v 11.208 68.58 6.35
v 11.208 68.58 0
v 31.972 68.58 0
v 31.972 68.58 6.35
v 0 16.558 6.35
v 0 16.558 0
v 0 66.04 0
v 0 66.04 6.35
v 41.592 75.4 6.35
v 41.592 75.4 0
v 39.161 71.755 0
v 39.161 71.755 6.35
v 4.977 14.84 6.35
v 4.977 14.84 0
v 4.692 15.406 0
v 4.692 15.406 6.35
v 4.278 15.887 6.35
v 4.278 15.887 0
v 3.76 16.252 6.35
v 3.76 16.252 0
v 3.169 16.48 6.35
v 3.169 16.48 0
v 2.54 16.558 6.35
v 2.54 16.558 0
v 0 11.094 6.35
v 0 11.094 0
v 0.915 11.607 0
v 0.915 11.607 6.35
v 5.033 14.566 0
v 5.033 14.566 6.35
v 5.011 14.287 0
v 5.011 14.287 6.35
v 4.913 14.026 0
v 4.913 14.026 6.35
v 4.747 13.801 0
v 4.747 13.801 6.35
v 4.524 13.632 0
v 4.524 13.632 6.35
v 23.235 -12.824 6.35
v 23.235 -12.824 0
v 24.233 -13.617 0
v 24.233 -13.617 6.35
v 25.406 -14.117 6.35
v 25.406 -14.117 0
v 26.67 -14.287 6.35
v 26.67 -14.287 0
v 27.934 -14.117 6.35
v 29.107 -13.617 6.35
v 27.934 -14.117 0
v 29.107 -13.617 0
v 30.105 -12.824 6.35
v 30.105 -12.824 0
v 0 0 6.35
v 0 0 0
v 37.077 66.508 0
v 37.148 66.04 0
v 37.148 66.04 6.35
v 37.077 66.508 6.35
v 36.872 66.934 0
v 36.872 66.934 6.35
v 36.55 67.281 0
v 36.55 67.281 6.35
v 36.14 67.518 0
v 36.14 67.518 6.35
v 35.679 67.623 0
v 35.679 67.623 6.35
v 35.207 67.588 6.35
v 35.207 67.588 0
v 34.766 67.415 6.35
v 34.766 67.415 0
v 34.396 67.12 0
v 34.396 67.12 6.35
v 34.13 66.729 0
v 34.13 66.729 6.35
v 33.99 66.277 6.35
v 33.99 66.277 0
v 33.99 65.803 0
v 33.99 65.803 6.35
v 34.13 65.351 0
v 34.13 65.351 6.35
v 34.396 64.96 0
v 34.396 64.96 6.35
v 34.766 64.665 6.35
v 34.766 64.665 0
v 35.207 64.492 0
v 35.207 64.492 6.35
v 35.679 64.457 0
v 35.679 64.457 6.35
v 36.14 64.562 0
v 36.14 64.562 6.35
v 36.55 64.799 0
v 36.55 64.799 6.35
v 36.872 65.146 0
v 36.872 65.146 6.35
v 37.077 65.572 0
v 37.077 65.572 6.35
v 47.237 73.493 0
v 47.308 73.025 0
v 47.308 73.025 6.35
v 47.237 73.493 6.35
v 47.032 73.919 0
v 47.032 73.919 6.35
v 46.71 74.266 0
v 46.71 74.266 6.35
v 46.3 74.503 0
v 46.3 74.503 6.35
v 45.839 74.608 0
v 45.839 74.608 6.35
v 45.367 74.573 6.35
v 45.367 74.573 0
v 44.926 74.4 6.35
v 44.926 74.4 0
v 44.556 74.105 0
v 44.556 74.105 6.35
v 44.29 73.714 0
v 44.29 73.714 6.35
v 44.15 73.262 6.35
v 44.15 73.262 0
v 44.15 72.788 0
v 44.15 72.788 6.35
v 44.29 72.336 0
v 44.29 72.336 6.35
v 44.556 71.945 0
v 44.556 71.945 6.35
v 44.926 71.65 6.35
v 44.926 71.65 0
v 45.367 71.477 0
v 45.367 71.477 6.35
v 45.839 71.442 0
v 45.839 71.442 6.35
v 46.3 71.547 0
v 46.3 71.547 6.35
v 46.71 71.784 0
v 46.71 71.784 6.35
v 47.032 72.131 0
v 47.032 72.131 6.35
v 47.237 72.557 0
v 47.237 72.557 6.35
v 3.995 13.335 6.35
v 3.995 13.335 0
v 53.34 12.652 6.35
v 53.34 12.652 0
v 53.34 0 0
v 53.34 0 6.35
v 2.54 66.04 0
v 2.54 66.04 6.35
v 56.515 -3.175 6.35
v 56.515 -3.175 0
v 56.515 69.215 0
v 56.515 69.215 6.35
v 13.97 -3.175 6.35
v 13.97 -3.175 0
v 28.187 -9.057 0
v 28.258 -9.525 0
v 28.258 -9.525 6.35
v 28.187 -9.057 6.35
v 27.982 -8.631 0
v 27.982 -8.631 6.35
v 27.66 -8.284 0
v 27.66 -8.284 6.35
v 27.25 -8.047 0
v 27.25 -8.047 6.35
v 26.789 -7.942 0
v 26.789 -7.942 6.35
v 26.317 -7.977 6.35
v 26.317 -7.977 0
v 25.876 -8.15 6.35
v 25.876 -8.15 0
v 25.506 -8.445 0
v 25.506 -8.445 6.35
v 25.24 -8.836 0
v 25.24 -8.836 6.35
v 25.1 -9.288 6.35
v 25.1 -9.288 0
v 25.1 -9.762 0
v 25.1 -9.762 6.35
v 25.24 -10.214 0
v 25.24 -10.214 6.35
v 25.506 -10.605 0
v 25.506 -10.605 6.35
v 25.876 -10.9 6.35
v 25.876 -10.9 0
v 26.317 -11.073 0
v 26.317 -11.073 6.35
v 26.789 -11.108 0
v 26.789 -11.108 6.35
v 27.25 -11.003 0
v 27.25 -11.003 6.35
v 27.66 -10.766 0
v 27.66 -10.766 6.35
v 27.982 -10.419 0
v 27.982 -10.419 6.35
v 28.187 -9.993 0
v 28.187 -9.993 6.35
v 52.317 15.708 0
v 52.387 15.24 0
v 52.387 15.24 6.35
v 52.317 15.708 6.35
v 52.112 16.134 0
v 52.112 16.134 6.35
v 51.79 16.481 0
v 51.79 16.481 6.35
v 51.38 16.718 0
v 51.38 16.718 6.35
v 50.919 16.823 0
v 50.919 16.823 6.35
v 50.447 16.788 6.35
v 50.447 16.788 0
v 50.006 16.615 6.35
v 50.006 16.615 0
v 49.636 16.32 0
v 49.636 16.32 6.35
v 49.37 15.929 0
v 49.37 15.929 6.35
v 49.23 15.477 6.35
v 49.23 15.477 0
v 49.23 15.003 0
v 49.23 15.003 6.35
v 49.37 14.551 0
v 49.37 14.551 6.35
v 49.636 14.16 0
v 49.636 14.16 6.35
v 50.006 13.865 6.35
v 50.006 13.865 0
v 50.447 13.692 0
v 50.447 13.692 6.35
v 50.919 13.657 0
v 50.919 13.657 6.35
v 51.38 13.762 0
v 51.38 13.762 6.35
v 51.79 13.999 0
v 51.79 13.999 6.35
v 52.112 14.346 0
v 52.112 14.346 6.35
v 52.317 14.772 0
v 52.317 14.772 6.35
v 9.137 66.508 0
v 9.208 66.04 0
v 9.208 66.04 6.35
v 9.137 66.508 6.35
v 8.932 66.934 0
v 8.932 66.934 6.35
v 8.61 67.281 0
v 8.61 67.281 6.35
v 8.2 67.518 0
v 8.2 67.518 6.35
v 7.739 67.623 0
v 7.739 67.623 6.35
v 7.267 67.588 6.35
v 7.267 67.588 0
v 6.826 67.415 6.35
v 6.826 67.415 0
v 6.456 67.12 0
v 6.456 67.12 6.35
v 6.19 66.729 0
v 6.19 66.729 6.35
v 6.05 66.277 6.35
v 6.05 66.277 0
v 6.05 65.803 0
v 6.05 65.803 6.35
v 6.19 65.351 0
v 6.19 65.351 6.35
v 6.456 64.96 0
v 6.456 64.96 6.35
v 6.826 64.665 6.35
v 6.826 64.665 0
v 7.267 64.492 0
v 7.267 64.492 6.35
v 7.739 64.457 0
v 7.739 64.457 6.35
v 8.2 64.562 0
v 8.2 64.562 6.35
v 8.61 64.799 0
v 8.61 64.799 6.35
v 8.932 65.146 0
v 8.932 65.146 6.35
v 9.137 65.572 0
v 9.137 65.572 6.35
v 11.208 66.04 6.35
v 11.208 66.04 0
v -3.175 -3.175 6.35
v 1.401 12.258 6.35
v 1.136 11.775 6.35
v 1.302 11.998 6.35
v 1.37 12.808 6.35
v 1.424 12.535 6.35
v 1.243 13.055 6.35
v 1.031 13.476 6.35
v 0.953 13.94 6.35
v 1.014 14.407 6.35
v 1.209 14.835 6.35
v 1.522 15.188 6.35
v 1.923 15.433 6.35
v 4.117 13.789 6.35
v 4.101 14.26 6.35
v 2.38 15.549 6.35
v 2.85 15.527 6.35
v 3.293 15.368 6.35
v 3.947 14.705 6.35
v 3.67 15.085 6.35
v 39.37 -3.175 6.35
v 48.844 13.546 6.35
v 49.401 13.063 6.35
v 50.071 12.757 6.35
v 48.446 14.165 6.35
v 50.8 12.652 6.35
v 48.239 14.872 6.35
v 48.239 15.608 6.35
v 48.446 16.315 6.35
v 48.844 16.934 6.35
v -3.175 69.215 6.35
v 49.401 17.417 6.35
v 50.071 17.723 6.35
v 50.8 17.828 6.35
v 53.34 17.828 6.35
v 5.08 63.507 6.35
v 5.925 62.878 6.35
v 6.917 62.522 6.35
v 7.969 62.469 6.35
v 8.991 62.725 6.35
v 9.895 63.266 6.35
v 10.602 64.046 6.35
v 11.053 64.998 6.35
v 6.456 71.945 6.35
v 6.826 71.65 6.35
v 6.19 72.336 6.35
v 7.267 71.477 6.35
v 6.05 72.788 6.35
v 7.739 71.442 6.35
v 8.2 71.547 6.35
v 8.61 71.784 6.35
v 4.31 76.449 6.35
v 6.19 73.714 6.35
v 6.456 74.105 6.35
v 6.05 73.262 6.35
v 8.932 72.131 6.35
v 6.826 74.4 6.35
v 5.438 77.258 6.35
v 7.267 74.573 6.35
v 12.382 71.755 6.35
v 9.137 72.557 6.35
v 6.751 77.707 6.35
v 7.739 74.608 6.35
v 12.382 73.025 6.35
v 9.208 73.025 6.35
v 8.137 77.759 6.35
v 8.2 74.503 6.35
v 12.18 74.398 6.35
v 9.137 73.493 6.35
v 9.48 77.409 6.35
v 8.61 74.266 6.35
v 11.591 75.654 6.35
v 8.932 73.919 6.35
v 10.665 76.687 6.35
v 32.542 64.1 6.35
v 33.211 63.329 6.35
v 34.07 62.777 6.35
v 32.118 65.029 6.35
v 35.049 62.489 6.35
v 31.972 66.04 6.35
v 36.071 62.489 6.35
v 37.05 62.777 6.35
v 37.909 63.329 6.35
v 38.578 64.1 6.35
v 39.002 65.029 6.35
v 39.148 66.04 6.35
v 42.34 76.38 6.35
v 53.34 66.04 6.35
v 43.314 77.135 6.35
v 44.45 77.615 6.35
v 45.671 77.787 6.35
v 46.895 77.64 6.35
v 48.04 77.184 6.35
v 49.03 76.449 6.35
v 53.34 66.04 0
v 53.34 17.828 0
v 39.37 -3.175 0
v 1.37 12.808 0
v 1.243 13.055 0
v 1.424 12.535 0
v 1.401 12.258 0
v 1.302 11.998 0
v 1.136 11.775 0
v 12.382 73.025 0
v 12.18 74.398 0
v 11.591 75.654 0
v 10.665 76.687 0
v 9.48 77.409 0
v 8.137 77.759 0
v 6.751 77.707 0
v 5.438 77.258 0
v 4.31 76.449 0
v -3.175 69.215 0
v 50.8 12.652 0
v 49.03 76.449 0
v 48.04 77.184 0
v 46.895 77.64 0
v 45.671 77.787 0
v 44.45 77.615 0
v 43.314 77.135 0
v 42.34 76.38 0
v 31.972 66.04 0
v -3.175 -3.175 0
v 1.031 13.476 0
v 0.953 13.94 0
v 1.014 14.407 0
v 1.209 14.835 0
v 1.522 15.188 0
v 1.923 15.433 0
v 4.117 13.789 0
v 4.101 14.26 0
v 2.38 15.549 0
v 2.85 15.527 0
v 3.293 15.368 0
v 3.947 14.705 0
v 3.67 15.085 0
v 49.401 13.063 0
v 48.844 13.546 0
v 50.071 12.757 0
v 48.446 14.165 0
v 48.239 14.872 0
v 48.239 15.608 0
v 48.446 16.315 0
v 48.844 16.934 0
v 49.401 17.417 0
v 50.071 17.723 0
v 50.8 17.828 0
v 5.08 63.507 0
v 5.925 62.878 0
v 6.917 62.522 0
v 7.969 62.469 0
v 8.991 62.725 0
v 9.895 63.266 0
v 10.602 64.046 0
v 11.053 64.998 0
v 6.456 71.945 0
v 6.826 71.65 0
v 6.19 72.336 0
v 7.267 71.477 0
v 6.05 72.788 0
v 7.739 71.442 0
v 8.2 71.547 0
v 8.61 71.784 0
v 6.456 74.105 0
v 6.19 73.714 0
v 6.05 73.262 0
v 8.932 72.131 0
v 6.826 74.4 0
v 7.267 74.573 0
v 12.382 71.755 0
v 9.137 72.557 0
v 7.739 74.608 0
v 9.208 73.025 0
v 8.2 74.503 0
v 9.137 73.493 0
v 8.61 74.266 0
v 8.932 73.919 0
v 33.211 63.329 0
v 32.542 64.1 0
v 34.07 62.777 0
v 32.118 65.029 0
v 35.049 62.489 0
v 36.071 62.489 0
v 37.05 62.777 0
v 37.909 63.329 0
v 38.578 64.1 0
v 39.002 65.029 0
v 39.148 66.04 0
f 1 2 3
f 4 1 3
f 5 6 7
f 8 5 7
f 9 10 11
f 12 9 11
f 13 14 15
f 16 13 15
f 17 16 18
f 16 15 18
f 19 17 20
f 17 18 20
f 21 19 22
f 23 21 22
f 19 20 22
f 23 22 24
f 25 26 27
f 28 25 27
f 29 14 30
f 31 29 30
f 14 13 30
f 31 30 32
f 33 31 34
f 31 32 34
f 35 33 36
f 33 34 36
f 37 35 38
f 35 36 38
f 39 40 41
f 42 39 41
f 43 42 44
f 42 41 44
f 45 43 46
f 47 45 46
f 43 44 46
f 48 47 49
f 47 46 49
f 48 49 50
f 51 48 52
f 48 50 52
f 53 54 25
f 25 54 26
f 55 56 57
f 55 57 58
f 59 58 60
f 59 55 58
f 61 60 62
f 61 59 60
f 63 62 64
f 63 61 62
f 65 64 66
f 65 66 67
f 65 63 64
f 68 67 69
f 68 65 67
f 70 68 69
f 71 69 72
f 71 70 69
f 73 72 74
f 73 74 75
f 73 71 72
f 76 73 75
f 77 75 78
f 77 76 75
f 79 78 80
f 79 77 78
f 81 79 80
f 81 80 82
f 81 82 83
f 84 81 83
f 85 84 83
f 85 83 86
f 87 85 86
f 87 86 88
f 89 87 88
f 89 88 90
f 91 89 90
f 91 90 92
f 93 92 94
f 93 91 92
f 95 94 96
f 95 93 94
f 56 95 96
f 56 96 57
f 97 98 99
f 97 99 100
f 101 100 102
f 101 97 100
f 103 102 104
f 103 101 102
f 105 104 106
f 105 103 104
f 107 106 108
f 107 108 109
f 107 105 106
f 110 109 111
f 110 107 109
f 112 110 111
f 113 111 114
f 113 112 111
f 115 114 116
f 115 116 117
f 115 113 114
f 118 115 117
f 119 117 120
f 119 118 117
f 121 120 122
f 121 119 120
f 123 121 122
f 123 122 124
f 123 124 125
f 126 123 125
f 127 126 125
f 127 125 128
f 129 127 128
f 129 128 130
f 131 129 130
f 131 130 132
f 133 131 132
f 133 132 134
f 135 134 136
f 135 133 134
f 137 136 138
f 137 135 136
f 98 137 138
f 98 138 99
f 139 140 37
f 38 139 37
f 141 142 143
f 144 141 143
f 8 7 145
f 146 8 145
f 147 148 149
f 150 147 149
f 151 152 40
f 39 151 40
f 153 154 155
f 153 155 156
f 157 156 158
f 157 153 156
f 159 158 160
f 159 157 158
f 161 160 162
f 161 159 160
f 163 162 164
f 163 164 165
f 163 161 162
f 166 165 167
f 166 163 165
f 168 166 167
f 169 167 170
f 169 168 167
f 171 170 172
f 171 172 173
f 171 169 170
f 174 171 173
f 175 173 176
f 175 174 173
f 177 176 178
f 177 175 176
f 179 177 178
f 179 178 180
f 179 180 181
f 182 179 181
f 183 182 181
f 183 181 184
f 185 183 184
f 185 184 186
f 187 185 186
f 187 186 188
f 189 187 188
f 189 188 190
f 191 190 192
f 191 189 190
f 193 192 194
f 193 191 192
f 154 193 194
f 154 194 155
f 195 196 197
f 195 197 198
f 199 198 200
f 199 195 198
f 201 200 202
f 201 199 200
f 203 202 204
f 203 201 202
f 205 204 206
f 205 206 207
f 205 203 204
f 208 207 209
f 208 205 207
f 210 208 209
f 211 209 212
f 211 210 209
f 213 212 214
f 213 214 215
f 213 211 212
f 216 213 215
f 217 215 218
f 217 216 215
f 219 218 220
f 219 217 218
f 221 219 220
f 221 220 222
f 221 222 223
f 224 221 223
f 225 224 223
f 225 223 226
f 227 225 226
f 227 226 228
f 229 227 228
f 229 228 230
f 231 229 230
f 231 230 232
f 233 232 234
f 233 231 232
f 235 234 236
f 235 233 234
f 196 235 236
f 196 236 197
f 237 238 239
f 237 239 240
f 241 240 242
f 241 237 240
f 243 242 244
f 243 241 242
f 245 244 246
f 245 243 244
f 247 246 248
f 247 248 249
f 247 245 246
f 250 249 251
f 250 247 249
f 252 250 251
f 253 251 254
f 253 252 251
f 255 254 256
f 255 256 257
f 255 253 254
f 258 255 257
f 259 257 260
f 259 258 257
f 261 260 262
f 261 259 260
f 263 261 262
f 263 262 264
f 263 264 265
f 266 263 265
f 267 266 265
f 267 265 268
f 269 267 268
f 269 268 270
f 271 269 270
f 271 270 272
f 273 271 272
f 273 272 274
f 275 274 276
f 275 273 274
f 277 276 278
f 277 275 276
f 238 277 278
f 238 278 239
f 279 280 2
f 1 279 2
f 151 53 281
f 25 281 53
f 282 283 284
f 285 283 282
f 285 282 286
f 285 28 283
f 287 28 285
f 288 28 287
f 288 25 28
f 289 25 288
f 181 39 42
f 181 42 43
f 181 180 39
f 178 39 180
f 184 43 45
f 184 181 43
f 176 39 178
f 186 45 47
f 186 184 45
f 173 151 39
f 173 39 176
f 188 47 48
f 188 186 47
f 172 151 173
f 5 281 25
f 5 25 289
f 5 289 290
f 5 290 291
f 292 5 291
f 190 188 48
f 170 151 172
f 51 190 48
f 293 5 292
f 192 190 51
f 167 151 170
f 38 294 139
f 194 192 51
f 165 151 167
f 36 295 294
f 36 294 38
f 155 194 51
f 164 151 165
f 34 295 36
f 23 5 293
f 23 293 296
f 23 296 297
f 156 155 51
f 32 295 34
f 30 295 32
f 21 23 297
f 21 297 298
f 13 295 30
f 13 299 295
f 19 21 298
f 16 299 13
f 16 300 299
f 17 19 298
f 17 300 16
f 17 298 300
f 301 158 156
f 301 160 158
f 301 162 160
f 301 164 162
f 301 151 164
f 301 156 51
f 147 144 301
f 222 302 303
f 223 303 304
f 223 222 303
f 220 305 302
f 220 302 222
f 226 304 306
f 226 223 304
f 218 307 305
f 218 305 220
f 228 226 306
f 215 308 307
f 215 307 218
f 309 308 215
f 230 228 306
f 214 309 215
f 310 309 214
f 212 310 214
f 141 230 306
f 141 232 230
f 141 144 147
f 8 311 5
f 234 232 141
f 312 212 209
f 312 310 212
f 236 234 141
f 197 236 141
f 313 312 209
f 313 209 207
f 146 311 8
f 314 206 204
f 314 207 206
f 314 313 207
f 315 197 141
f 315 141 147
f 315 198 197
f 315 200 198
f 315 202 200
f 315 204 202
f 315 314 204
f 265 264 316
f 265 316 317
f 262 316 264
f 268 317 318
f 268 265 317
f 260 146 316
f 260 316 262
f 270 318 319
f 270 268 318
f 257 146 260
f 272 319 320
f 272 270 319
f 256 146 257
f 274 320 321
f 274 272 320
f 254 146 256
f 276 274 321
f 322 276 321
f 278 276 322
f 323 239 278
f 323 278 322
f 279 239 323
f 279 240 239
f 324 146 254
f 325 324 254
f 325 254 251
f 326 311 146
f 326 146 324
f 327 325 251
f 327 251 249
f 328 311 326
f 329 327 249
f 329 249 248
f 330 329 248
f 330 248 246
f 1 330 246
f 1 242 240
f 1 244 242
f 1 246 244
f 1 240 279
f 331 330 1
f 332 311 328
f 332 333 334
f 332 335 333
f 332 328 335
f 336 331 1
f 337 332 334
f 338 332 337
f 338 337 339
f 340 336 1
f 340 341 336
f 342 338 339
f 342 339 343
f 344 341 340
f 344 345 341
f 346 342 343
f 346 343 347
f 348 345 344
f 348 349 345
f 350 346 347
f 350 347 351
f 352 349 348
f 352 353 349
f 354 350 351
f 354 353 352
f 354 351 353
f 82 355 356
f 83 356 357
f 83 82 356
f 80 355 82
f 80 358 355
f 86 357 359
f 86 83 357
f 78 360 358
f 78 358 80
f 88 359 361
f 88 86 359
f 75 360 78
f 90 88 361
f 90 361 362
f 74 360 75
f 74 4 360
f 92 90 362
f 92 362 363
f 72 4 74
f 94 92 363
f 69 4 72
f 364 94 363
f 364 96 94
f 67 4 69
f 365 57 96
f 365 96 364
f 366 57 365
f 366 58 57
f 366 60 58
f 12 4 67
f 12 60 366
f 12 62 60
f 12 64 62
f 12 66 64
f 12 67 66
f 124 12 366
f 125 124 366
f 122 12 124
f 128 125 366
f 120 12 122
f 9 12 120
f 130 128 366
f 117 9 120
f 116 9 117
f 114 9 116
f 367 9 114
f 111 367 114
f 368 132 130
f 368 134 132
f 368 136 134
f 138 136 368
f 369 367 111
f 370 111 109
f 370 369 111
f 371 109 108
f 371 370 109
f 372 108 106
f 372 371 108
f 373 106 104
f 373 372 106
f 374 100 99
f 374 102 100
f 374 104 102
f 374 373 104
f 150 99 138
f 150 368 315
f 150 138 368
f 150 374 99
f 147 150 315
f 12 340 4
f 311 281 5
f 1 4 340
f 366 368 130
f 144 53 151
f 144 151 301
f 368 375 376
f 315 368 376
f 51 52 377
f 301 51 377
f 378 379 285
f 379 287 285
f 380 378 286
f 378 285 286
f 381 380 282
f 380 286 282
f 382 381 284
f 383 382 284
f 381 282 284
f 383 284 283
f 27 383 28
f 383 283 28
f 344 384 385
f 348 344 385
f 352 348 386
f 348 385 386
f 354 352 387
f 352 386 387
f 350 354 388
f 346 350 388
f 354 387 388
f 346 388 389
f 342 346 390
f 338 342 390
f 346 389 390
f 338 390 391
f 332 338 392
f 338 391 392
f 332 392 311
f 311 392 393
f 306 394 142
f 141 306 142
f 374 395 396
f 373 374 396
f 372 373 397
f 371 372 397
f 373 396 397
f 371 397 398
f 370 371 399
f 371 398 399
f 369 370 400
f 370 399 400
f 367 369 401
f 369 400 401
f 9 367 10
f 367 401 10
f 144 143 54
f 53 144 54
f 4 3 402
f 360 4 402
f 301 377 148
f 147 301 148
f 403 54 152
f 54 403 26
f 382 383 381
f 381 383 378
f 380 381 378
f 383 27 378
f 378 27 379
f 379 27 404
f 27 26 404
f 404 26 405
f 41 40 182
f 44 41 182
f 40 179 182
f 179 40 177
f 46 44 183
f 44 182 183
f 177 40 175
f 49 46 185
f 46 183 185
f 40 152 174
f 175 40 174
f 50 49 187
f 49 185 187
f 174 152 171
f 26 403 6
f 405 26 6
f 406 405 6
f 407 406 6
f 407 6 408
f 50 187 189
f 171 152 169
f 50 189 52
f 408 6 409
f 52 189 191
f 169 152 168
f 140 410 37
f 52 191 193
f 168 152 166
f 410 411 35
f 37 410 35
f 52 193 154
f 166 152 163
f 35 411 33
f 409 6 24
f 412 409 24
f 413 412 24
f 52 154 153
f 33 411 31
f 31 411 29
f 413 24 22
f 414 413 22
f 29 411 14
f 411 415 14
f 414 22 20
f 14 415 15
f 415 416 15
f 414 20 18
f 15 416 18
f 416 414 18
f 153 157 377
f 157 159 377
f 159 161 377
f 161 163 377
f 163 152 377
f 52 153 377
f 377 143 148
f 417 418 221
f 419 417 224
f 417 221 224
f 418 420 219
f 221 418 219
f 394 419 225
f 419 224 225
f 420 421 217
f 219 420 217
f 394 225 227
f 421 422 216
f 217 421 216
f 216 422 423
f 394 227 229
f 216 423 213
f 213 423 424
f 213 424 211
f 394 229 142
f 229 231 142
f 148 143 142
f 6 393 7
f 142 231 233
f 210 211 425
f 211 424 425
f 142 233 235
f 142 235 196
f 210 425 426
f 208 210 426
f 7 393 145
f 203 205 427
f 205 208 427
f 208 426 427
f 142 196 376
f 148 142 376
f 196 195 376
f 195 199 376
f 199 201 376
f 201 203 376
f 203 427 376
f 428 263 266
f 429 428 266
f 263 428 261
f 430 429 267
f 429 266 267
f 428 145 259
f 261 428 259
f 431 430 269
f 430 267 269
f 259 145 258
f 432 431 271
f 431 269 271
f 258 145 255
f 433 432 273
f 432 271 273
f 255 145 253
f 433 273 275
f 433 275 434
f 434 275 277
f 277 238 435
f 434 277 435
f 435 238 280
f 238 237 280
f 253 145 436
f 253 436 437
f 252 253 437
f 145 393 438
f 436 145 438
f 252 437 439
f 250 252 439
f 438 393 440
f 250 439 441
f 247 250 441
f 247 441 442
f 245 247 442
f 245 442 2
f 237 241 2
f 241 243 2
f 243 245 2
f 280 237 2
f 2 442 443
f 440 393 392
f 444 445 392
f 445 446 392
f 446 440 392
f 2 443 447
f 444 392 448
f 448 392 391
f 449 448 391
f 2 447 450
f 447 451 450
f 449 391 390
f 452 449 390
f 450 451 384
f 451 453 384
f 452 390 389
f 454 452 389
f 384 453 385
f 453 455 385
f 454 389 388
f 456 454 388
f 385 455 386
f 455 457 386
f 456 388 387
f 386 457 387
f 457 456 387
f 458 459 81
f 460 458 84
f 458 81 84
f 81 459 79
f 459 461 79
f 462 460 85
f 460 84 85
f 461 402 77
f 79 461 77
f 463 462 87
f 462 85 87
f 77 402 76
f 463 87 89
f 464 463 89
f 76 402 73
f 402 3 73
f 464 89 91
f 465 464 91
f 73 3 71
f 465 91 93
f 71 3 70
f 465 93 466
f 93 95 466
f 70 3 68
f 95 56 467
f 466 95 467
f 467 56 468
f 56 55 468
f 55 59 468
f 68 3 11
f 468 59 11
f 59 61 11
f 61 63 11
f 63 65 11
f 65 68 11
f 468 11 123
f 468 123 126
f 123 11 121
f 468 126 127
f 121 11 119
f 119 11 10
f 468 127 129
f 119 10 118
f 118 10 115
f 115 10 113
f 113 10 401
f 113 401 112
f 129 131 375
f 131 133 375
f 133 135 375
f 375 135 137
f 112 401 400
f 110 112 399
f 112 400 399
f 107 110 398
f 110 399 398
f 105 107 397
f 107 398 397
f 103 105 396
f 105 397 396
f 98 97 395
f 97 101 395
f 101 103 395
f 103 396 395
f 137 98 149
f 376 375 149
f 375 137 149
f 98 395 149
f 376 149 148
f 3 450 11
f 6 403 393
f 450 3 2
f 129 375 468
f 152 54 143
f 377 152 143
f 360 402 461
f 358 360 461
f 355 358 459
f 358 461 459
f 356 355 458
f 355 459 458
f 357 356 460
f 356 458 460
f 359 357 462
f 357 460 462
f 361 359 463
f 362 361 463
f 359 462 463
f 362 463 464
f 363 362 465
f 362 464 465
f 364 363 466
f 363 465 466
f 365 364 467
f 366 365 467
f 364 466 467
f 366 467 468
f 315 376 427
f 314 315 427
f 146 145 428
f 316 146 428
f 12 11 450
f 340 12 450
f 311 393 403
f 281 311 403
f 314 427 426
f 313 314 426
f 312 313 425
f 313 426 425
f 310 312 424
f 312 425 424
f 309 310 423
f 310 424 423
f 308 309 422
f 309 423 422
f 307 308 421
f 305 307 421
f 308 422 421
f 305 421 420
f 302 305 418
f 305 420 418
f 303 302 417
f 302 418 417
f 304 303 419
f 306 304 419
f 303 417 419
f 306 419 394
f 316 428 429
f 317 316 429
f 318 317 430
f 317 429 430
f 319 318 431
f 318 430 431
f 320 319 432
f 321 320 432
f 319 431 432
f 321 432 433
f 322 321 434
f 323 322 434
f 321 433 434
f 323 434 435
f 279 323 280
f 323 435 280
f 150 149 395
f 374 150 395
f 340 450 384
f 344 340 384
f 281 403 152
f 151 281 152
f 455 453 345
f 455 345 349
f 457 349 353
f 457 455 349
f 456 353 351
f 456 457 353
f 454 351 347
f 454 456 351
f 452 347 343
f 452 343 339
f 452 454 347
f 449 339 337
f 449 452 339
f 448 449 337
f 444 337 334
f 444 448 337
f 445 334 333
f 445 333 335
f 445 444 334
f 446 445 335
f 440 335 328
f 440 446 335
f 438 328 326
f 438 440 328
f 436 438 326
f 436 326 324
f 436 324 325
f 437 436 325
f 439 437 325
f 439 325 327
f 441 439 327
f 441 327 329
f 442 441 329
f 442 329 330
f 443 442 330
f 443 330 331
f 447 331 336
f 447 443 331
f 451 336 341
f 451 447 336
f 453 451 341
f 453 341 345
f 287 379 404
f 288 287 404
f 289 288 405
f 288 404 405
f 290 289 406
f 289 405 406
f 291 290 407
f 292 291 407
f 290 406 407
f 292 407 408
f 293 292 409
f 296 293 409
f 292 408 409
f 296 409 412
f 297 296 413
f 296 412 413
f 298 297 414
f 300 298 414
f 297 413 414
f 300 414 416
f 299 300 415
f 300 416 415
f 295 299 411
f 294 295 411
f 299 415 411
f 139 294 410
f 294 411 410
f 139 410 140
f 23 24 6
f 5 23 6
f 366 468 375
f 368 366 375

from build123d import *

# Parameters (mm, degrees)
SKETCH1_R           = 1.5875
BOSS_EXTRUDE1_DEPTH = 6.35
FILLET1_R           = 1


with BuildPart() as part:
    # Sketch1 → Boss-Extrude1 (new body)
    with BuildSketch(Plane.XY):
        with BuildLine():
            Line((13.97, -3.175), (23.234773085, -12.823578829))
            ThreePointArc((23.234773085, -12.823578829), (26.67, -14.2875), (30.105226915, -12.823578829))
            Line((30.105226915, -12.823578829), (39.37, -3.175))
            Line((39.37, -3.175), (56.515, -3.175))
            Line((56.515, -3.175), (56.515, 69.215))
            Line((56.515, 69.215), (49.029740814, 76.449473973))
            ThreePointArc((49.029740814, 76.449473973), (45.054787809, 77.740813715), (41.592139899, 75.400326764))
            Line((41.592139899, 75.400326764), (39.161128061, 71.755))
            Line((39.161128061, 71.755), (12.3825, 71.755))
            Line((12.3825, 71.755), (12.3825, 73.025))
            ThreePointArc((12.3825, 73.025), (9.479941615, 77.409292809), (4.310259186, 76.449473973))
            Line((4.310259186, 76.449473973), (-3.175, 69.215))
            Line((-3.175, 69.215), (-3.175, -3.175))
            Line((-3.175, -3.175), (13.97, -3.175))
        make_face()
        with Locations((35.56, 66.04)):
            Circle(SKETCH1_R, mode=Mode.SUBTRACT)
        with Locations((7.62, 66.04)):
            Circle(SKETCH1_R, mode=Mode.SUBTRACT)
        with Locations((50.8, 15.24)):
            Circle(SKETCH1_R, mode=Mode.SUBTRACT)
        with Locations((26.67, -9.525)):
            Circle(SKETCH1_R, mode=Mode.SUBTRACT)
        with Locations((45.72, 73.025)):
            Circle(SKETCH1_R, mode=Mode.SUBTRACT)
        with Locations((7.62, 73.025)):
            Circle(SKETCH1_R, mode=Mode.SUBTRACT)
        with BuildLine():
            Line((53.34, 66.04), (53.34, 17.8275))
            Line((53.34, 17.8275), (50.8, 17.8275))
            ThreePointArc((50.8, 17.8275), (48.2125, 15.24), (50.8, 12.6525))
            Line((50.8, 12.6525), (53.34, 12.6525))
            Line((53.34, 12.6525), (53.34, 0))
            Line((53.34, 0), (0, 0))
            Line((0, 0), (0, 11.093834149))
            Line((0, 11.093834149), (2.323755448, 12.397297058))
            ThreePointArc((2.323755448, 12.397297058), (1.763362672, 15.354554336), (3.994811275, 13.334641515))
            Line((3.994811275, 13.334641515), (5.1275, 13.97))
            ThreePointArc((5.1275, 13.97), (4.369638796, 15.799638796), (2.54, 16.5575))
            Line((2.54, 16.5575), (0, 16.5575))
            Line((0, 16.5575), (0, 66.04))
            Line((0, 66.04), (2.54, 66.04))
            Line((2.54, 66.04), (5.08, 63.506513025))
            ThreePointArc((5.08, 63.506513025), (8.990749111, 62.724701654), (11.2075, 66.04))
            Line((11.2075, 66.04), (11.2075, 68.58))
            Line((11.2075, 68.58), (31.9725, 68.58))
            Line((31.9725, 68.58), (31.9725, 66.04))
            ThreePointArc((31.9725, 66.04), (35.56, 62.4525), (39.1475, 66.04))
            Line((39.1475, 66.04), (40.386, 66.04))
            Line((40.386, 66.04), (53.34, 66.04))
        make_face(mode=Mode.SUBTRACT)
    extrude(amount=BOSS_EXTRUDE1_DEPTH)

    # Fillet1
    fillet1_edges = [part.edges().sort_by_distance(p)[0] for p in [
        (5.1275, 13.97, 3.175),
        (2.323755448, 12.397297058, 3.175),
    ]]
    fillet(fillet1_edges, radius=FILLET1_R)


solid = part.part
